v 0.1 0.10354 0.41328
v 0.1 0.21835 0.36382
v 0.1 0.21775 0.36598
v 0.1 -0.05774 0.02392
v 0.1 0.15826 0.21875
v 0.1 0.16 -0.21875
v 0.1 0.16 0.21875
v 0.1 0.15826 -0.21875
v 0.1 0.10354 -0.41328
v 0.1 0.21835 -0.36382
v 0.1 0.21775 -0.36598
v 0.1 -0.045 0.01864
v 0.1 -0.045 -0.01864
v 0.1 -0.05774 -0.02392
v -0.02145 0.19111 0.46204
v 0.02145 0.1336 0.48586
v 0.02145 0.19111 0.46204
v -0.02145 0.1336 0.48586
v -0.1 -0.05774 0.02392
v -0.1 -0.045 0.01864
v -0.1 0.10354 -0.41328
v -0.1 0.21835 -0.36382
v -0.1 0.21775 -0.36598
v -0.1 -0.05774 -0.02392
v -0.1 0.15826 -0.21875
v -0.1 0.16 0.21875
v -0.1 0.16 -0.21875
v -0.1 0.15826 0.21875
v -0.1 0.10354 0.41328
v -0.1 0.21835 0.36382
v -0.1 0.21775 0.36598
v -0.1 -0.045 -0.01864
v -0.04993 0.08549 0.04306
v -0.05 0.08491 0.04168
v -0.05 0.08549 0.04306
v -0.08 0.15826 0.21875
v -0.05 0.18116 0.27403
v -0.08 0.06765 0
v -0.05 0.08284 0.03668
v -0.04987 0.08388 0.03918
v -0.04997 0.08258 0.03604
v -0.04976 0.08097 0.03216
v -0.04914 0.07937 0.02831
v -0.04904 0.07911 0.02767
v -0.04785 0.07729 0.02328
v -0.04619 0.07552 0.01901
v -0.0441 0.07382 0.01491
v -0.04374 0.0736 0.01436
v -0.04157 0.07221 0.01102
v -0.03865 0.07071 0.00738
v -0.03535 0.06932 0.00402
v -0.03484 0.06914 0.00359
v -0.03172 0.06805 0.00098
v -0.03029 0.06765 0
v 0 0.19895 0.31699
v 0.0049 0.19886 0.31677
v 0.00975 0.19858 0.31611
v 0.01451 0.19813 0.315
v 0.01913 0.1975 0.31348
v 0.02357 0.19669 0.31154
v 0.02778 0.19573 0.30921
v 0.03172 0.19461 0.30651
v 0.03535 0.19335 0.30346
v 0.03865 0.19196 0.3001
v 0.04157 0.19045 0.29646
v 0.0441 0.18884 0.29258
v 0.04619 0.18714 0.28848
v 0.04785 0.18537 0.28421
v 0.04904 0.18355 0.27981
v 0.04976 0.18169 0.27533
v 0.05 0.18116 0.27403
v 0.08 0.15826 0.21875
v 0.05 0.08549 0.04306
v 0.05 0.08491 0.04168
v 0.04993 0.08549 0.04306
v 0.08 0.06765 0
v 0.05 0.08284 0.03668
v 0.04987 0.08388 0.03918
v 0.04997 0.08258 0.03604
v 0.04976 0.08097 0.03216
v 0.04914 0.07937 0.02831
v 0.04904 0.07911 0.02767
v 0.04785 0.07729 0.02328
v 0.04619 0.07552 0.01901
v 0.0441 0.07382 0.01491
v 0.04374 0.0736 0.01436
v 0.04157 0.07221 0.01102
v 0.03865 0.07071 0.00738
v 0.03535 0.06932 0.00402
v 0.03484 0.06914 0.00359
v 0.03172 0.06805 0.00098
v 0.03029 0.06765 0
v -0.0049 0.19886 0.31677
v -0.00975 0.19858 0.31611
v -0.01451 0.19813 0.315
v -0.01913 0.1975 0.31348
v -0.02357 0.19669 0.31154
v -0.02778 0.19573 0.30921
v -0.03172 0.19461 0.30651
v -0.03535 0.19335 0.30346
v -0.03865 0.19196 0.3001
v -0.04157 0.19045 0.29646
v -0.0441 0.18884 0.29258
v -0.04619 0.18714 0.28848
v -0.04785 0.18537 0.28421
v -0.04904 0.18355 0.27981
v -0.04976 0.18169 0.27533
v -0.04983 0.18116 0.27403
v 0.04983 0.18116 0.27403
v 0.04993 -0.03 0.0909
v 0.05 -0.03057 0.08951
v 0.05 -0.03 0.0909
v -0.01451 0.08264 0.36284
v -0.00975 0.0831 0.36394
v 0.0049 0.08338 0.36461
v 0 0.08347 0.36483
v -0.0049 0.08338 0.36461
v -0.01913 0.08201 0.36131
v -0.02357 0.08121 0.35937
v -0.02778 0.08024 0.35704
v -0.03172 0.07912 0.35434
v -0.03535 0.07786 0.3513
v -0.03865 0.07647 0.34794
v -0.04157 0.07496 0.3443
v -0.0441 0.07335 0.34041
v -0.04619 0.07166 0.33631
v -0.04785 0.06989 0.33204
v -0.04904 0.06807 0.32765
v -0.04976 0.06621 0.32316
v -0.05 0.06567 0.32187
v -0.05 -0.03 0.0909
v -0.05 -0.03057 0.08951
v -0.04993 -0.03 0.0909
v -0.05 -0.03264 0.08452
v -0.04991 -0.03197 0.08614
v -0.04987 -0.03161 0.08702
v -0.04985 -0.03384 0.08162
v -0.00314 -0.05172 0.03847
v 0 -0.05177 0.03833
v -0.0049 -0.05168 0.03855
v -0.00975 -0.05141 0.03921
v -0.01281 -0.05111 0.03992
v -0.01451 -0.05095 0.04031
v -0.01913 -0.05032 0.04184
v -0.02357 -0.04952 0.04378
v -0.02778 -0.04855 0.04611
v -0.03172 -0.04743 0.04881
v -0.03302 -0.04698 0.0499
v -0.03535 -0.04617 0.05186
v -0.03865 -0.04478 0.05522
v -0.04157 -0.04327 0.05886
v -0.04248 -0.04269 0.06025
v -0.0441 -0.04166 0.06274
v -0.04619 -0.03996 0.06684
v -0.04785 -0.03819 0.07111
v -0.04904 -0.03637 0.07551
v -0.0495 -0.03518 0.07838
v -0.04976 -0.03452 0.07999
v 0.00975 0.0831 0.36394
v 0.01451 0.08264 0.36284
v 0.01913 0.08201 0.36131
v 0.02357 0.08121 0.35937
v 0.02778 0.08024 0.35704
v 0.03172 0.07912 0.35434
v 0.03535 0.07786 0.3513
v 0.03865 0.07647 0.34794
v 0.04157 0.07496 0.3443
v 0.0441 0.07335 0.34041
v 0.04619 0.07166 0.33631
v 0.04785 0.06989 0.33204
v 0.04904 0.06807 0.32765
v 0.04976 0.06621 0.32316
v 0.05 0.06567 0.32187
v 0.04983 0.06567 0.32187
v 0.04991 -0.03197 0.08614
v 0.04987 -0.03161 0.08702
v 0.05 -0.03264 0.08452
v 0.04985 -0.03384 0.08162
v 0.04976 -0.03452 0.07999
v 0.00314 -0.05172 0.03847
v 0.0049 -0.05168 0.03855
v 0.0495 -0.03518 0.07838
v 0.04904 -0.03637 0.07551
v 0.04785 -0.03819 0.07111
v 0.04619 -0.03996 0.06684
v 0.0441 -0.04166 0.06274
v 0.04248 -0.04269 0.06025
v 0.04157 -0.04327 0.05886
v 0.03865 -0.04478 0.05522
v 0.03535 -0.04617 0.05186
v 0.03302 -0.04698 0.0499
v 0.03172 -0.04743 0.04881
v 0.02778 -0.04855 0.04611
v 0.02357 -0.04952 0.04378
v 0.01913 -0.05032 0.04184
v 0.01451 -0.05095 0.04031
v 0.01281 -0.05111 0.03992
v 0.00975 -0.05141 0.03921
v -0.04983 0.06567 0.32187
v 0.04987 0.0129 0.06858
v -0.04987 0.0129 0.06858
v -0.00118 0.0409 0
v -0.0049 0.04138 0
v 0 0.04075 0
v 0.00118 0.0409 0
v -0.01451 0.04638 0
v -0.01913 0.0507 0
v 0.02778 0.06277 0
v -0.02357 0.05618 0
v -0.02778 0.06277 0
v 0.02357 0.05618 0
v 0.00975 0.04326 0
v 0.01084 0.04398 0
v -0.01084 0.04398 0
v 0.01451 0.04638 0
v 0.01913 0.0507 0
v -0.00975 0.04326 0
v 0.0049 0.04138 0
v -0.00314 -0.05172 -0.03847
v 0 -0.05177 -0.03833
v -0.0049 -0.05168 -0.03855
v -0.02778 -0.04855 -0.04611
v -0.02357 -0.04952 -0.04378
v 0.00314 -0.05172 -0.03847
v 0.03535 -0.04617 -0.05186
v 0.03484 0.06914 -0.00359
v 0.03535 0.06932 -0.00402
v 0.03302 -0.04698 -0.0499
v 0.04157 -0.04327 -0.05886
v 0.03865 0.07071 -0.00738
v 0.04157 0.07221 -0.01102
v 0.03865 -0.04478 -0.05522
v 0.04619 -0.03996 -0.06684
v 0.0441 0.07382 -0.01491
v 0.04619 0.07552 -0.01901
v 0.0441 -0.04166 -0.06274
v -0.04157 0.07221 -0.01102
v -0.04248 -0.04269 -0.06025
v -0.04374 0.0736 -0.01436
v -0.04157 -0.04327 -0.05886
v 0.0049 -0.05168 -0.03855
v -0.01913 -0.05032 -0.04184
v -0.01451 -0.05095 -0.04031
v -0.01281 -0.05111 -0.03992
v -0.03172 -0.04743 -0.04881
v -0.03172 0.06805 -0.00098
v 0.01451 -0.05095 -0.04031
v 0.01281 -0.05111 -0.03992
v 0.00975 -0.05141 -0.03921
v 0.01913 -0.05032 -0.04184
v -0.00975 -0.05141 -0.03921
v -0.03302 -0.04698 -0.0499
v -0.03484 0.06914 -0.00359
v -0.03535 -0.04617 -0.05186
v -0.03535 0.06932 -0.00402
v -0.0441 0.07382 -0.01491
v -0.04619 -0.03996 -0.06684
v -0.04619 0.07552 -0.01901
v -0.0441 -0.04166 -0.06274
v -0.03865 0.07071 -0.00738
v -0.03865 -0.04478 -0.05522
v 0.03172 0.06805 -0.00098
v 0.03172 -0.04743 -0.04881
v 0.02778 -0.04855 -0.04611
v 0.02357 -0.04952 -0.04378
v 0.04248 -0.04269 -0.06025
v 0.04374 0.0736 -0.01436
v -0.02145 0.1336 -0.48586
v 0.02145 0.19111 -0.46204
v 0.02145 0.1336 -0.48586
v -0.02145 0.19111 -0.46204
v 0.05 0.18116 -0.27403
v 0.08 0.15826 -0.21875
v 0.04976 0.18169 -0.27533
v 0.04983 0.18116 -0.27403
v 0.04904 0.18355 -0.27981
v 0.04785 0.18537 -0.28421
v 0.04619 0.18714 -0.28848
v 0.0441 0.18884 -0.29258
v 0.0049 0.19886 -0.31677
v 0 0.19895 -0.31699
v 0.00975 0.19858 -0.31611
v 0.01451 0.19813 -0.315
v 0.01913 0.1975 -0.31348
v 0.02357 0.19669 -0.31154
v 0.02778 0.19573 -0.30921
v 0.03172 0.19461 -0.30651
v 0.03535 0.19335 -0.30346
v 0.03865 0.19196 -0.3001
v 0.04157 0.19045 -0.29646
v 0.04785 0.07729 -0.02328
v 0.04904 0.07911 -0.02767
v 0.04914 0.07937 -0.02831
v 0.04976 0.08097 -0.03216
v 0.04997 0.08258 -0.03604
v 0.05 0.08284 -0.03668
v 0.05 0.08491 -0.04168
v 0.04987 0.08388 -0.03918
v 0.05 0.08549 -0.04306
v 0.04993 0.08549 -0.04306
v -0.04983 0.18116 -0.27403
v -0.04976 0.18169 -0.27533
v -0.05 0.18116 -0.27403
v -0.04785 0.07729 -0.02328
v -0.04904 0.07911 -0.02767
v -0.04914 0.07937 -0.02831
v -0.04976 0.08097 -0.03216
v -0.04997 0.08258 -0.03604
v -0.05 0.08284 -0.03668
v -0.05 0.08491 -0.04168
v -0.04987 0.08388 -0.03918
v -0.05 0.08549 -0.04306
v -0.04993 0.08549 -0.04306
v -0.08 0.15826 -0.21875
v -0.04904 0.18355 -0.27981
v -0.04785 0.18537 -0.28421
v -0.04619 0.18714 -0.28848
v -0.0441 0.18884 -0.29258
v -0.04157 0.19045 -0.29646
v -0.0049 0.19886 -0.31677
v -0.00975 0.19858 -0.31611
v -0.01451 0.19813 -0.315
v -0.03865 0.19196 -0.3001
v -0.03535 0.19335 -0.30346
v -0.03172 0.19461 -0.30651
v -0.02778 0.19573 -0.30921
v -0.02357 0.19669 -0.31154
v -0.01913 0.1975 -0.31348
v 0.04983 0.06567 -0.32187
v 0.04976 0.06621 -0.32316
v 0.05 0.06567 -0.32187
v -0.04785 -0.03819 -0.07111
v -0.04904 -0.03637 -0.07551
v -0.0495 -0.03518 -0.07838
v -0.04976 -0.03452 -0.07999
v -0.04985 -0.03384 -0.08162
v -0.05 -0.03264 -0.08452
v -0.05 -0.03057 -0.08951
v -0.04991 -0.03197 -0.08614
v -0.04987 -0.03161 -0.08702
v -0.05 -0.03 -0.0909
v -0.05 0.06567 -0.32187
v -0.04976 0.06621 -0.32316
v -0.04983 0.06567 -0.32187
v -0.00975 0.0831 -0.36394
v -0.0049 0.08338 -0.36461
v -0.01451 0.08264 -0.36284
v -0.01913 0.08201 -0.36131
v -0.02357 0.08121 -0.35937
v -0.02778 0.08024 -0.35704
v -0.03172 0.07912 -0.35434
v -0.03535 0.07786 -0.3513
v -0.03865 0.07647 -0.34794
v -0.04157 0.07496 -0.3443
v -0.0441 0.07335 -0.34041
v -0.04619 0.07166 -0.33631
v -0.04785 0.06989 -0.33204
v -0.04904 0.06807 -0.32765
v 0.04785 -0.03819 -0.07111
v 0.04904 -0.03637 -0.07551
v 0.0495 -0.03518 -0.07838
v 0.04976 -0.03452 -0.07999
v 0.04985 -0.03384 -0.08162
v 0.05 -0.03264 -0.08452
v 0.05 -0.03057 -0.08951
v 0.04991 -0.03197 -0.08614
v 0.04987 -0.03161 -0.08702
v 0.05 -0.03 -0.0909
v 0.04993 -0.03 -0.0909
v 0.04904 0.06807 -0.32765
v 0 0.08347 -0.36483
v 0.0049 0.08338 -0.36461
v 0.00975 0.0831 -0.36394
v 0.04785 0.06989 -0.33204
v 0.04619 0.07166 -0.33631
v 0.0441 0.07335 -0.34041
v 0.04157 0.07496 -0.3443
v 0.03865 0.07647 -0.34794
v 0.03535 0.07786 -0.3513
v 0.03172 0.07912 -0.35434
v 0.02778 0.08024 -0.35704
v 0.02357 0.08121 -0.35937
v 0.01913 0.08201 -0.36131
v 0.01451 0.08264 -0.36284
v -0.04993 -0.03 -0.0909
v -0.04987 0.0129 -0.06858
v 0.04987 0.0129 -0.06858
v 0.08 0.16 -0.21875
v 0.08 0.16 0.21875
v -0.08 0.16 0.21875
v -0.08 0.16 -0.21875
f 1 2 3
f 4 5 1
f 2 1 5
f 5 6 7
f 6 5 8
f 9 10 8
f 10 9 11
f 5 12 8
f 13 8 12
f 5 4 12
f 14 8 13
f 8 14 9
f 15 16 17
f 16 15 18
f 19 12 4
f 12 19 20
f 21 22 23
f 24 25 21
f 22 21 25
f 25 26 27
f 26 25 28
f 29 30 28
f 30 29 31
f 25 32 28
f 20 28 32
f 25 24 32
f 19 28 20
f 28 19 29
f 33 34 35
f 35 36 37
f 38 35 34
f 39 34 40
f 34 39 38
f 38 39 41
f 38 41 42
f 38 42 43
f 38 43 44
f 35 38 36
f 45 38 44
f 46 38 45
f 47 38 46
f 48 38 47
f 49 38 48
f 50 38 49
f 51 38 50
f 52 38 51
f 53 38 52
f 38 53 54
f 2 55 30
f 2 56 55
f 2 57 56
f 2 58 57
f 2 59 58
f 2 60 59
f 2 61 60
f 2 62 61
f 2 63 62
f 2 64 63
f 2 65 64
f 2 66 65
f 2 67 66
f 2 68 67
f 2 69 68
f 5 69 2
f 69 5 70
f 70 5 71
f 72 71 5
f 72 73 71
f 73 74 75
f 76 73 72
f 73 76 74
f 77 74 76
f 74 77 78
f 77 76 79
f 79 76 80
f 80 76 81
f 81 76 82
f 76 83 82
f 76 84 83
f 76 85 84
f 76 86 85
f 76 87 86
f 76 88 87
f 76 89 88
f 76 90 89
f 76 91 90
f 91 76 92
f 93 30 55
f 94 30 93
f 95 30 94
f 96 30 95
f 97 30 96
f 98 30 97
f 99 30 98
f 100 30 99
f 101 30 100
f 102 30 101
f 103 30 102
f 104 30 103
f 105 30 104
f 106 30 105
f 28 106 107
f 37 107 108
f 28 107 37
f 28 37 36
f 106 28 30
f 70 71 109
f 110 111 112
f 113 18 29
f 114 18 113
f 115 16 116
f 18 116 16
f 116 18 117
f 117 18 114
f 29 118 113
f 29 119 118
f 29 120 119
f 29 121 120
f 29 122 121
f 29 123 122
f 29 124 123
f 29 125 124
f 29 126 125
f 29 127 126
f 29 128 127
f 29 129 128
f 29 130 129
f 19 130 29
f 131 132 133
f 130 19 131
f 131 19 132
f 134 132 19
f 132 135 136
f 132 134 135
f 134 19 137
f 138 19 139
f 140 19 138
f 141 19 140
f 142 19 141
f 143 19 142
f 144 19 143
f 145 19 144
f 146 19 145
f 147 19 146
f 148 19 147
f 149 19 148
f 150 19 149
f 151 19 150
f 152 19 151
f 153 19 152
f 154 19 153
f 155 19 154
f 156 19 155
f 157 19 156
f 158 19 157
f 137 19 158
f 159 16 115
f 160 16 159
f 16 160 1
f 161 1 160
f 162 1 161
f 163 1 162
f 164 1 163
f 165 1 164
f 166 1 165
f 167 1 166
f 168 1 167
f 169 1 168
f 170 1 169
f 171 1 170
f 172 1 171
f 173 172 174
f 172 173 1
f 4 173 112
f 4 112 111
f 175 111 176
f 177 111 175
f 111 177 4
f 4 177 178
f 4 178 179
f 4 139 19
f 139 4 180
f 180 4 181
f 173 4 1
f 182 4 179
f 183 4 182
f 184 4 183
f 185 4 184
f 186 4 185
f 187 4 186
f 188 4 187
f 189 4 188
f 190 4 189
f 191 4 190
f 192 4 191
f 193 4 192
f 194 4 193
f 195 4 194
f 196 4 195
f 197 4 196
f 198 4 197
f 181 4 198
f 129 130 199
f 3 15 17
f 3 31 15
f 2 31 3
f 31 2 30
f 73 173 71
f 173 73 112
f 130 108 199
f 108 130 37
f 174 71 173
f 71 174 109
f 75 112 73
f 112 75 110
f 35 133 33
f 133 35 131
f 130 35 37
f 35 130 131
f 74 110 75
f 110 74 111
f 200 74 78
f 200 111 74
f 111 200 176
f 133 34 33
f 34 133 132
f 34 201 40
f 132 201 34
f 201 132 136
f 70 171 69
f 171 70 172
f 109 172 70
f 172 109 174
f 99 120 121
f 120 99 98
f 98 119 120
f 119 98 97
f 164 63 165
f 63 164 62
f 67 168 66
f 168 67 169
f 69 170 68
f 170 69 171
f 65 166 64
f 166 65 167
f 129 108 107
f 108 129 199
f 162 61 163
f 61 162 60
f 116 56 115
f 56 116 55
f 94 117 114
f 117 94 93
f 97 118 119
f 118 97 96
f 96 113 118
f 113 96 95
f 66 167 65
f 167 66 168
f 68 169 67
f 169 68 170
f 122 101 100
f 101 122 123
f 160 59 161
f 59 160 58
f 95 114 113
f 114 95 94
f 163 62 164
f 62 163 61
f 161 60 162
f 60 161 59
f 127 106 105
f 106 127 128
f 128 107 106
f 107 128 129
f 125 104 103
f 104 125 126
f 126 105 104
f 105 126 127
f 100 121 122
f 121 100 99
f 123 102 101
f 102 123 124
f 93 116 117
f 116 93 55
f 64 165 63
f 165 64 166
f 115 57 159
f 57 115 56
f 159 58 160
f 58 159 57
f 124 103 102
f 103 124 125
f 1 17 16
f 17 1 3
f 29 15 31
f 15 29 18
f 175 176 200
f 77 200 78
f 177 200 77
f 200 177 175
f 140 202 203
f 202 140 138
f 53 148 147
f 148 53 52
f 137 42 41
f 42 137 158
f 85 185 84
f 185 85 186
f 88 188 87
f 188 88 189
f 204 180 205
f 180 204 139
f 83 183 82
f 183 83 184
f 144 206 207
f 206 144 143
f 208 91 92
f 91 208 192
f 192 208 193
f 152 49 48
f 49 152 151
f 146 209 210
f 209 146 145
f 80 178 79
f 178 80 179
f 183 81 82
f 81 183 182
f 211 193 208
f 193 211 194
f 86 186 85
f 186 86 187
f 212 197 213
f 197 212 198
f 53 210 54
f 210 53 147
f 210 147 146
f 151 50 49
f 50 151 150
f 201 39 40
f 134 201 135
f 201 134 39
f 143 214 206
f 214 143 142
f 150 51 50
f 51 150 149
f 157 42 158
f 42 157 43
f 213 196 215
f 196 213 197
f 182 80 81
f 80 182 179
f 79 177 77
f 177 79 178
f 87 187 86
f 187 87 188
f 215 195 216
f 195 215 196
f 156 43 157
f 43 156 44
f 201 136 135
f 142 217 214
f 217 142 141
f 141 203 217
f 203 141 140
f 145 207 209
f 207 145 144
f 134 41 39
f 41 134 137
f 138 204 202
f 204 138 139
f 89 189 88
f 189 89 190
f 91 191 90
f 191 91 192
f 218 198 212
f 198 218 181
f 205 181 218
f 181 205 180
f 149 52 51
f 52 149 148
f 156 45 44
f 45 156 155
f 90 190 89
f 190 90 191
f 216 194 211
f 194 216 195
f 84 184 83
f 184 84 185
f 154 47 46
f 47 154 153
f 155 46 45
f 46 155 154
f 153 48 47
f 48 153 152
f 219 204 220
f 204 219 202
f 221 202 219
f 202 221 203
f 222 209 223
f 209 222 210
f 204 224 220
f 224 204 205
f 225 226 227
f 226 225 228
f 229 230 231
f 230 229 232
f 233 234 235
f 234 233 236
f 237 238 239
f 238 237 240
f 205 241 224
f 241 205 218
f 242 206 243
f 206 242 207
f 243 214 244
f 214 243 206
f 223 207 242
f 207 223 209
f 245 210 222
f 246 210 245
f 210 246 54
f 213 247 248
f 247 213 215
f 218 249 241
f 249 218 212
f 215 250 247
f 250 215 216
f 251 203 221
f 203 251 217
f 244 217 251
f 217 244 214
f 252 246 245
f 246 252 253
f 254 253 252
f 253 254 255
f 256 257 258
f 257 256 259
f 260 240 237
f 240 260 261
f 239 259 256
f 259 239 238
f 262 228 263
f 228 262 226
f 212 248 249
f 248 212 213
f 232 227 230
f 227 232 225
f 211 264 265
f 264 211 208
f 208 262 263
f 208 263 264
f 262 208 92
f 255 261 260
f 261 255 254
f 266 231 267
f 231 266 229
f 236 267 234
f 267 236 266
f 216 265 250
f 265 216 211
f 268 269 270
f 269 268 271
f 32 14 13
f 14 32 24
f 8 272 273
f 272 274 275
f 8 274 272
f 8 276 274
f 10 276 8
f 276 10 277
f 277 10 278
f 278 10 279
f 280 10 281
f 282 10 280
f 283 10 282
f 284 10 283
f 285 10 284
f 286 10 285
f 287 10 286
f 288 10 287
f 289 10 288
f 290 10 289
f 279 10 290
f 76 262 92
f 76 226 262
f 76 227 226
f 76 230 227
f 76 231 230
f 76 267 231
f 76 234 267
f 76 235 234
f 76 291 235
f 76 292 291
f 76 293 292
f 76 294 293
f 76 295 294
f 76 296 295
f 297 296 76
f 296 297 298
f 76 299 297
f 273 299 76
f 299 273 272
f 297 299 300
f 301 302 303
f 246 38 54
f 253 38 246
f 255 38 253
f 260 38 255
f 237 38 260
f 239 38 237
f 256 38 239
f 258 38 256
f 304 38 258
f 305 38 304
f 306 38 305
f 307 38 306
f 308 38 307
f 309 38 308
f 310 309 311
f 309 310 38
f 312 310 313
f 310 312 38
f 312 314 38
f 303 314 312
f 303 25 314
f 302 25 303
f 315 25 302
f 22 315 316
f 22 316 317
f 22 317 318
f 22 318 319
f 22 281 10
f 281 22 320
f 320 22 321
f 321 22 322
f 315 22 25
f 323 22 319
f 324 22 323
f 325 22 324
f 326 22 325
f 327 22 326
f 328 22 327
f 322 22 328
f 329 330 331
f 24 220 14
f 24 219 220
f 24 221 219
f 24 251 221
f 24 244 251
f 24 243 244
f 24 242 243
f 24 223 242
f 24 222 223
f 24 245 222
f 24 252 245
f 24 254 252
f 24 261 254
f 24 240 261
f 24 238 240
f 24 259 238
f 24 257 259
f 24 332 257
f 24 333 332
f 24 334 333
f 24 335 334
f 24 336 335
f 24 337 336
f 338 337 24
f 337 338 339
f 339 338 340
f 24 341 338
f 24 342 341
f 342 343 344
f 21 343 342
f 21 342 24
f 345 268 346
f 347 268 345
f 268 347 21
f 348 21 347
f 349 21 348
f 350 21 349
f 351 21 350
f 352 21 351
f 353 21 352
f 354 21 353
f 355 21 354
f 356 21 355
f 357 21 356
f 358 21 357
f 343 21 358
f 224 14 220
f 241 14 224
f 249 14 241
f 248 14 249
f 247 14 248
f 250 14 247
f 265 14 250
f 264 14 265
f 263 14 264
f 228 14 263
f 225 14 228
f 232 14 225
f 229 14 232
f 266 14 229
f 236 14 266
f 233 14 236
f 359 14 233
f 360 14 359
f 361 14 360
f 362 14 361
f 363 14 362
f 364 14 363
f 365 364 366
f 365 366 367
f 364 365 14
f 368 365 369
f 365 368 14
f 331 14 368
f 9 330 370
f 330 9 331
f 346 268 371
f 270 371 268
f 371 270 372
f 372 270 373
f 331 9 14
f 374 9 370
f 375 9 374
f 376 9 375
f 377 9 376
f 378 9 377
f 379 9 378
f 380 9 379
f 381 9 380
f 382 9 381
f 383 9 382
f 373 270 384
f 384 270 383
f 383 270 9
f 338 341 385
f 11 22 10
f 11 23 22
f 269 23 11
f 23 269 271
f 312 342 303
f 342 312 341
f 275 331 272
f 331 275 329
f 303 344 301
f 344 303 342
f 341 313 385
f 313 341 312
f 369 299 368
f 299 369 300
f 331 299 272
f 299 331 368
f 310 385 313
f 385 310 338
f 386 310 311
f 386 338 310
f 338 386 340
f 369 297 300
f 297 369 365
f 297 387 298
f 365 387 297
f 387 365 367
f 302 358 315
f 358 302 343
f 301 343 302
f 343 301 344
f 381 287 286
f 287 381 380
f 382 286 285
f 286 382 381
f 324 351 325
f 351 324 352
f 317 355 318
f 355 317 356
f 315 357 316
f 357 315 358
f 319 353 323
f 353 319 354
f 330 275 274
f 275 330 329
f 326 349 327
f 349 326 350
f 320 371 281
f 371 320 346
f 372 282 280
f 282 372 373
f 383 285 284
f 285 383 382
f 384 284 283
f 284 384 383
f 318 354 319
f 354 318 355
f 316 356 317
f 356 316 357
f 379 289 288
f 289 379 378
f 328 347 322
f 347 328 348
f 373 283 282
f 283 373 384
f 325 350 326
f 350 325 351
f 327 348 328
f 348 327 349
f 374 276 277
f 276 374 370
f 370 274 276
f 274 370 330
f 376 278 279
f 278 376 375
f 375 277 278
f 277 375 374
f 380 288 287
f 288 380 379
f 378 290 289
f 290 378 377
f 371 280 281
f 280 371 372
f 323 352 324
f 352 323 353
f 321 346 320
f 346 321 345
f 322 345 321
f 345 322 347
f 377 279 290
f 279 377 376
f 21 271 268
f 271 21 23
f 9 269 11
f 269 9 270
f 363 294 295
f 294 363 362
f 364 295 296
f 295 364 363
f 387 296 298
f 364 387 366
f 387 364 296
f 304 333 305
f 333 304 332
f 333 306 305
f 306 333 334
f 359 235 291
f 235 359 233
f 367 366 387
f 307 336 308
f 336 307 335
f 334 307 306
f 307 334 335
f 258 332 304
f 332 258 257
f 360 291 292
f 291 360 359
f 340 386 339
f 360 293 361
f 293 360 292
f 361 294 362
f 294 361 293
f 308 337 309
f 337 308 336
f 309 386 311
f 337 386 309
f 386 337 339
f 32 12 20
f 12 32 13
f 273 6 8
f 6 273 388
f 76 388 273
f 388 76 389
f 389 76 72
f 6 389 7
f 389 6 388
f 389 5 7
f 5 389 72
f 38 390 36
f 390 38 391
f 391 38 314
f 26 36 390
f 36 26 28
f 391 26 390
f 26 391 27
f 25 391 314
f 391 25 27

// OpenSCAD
// file: Robot_Body_008.scad
// ----------------------------------------------------------------------------------------------------
// PROJECT INFORMATION

// NAME:  Robot Body
// REVISION:  A1
// START DATE:  7/4/2023
// CURRENT VERSION DATE:  7/12/2023
// LICENSE:  GPLv3
// AUTHOR:  Justin Grimes (@zelon88)
// DESCRIPTION:  A body for tracked robot.
// ----------------------------------------------------------------------------------------------------

// ----------------------------------------------------------------------------------------------------
// PART INFORMATION

// NAME:  Robot Body Fastener Half
// REVISION:  A1
// START DATE:  7/11/2023
// CURRENT VERSION DATE:  7/12/2023
// AUTHOR:  Justin Grimes (@zelon88)
// DESCRIPTION:  
//    A fastener for joining body panels together.
//    The purpose of this part is to modularize the design of body fasteners.
//    This part does not need to be printed.
// FILE NAME: Robot_Body_008.scad
// ----------------------------------------------------------------------------------------------------

// ----------------------------------------------------------------------------------------------------
// PRINTER CONFIGURATION

// ----------------------------------------------------------------------------------------------------

// ----------------------------------------------------------------------------------------------------
// MANUFACTURING INSTRUCTIONS

// ----------------------------------------------------------------------------------------------------

// ----------------------------------------------------------------------------------------------------
// MODULES

// ----------------------------------------------------------------------------------------------------

// ----------------------------------------------------------------------------------------------------
// GEOMETRY

// 45 Degree Body Fastener.
difference() { 
  // Body of Fastener.
  translate([0, 0, 0.25]) cube([0.2, 0.125, 0.5], center=true);

  // Tapered Edge.
  translate([0, 0.04, 0.55]) rotate([38, 0, 0]) cube([0.5, 0.125, .5], center=true);

  // Upper Slot.
  translate([0, 0, 0.1975]) cube([0.1, 0.125, .25], center=true);

  // Inner Radius of Slot.
  translate([0, 0, 0.071]) rotate([90, 0, 0]) cylinder(r=0.05, h=0.125, $fn=64, center=true);

  // Outer Radius of Slot.
  translate([0, 0, 0.319]) rotate([90, 0, 0]) cylinder(r=0.05, h=0.125, $fn=64, center=true);

  // Edge Chamfers.
  translate([0.3125, 0, 0.5625]) rotate([0, 45, 0]) cube([0.5, 0.5, 0.5], center=true);
  translate([-0.3125, 0, 0.5625]) rotate([0, 45, 0]) cube([0.5, 0.5, 0.5], center=true); }
// ----------------------------------------------------------------------------------------------------
// main file
// ----------------------------------------------------------------------------------------------------
// PROJECT INFORMATION

// NAME:  Robot Body
// REVISION:  A1
// START DATE:  7/4/2023
// CURRENT VERSION DATE:  7/12/2023
// LICENSE:  GPLv3
// AUTHOR:  Justin Grimes (@zelon88)
// DESCRIPTION:  A body for tracked robot.
// ----------------------------------------------------------------------------------------------------

// ----------------------------------------------------------------------------------------------------
// PART INFORMATION

// NAME:  Robot Body 45 Degree Fastener
// REVISION:  A1
// START DATE:  7/11/2023
// CURRENT VERSION DATE:  7/12/2023
// AUTHOR:  Justin Grimes (@zelon88)
// DESCRIPTION:  
//    A fastener for joining body panels together.
// FILE NAME: Robot_Body_009.scad
// ----------------------------------------------------------------------------------------------------

// ----------------------------------------------------------------------------------------------------
// PRINTER CONFIGURATION

// ----------------------------------------------------------------------------------------------------

// ----------------------------------------------------------------------------------------------------
// MANUFACTURING INSTRUCTIONS

// ----------------------------------------------------------------------------------------------------

// ----------------------------------------------------------------------------------------------------
// MODULES

// ----------------------------------------------------------------------------------------------------

// ----------------------------------------------------------------------------------------------------
// GEOMETRY

// 45 Degree Body Fastener.

// Load the modular fastner portion "Robot_Body_008.scad" and rotate it.
difference() { 
  rotate([-22.5, 0, 0]) include <Robot_Body_008.scad>;

  // Clean Up Inner Slot.
  translate([0, 0, 0.071]) rotate([067.5, 0, 0]) cylinder(r=0.05, h=0.25, $fn=64, center=true); 
  // Clean Up Outer Slot.
  translate([0, 0, -0.071]) rotate([112.5, 0, 0]) cylinder(r=0.05, h=0.25, $fn=64, center=true); }

difference() { 
  rotate([-22.5, 180, 0]) include <Robot_Body_008.scad>;

  // Clean Up Inner Slot.
  translate([0, 0, 0.071]) rotate([067.5, 0, 0]) cylinder(r=0.05, h=0.25, $fn=64, center=true); 
  // Clean Up Outer Slot.
  translate([0, 0, -0.071]) rotate([112.5, 0, 0]) cylinder(r=0.05, h=0.25, $fn=64, center=true); }

// Fill In The Center Gap.
difference() { 
  cube([0.2, 0.09, 0.09], center=true);

  // Clean Up Inner Slot.
  translate([0, 0, 0.071]) rotate([067.5, 0, 0]) cylinder(r=0.05, h=0.25, $fn=64, center=true); 
  // Clean Up Outer Slot.
  translate([0, 0, -0.071]) rotate([112.5, 0, 0]) cylinder(r=0.05, h=0.25, $fn=64, center=true); }

// Add side Reinforcements.
translate([0.09, 0.11, -0.1]) rotate([0, 0, 0]) cube([0.02, 0.1, 0.2375], center=true);
translate([0.09, 0.11, 0.1]) rotate([0, 0, 0]) cube([0.02, 0.1, 0.2375], center=true);
translate([-0.09, 0.11, 0.1]) rotate([0, 0, 0]) cube([0.02, 0.1, 0.2375], center=true);
translate([-0.09, 0.11, -0.1]) rotate([0, 0, 0]) cube([0.02, 0.1, 0.2375], center=true);
// ----------------------------------------------------------------------------------------------------
